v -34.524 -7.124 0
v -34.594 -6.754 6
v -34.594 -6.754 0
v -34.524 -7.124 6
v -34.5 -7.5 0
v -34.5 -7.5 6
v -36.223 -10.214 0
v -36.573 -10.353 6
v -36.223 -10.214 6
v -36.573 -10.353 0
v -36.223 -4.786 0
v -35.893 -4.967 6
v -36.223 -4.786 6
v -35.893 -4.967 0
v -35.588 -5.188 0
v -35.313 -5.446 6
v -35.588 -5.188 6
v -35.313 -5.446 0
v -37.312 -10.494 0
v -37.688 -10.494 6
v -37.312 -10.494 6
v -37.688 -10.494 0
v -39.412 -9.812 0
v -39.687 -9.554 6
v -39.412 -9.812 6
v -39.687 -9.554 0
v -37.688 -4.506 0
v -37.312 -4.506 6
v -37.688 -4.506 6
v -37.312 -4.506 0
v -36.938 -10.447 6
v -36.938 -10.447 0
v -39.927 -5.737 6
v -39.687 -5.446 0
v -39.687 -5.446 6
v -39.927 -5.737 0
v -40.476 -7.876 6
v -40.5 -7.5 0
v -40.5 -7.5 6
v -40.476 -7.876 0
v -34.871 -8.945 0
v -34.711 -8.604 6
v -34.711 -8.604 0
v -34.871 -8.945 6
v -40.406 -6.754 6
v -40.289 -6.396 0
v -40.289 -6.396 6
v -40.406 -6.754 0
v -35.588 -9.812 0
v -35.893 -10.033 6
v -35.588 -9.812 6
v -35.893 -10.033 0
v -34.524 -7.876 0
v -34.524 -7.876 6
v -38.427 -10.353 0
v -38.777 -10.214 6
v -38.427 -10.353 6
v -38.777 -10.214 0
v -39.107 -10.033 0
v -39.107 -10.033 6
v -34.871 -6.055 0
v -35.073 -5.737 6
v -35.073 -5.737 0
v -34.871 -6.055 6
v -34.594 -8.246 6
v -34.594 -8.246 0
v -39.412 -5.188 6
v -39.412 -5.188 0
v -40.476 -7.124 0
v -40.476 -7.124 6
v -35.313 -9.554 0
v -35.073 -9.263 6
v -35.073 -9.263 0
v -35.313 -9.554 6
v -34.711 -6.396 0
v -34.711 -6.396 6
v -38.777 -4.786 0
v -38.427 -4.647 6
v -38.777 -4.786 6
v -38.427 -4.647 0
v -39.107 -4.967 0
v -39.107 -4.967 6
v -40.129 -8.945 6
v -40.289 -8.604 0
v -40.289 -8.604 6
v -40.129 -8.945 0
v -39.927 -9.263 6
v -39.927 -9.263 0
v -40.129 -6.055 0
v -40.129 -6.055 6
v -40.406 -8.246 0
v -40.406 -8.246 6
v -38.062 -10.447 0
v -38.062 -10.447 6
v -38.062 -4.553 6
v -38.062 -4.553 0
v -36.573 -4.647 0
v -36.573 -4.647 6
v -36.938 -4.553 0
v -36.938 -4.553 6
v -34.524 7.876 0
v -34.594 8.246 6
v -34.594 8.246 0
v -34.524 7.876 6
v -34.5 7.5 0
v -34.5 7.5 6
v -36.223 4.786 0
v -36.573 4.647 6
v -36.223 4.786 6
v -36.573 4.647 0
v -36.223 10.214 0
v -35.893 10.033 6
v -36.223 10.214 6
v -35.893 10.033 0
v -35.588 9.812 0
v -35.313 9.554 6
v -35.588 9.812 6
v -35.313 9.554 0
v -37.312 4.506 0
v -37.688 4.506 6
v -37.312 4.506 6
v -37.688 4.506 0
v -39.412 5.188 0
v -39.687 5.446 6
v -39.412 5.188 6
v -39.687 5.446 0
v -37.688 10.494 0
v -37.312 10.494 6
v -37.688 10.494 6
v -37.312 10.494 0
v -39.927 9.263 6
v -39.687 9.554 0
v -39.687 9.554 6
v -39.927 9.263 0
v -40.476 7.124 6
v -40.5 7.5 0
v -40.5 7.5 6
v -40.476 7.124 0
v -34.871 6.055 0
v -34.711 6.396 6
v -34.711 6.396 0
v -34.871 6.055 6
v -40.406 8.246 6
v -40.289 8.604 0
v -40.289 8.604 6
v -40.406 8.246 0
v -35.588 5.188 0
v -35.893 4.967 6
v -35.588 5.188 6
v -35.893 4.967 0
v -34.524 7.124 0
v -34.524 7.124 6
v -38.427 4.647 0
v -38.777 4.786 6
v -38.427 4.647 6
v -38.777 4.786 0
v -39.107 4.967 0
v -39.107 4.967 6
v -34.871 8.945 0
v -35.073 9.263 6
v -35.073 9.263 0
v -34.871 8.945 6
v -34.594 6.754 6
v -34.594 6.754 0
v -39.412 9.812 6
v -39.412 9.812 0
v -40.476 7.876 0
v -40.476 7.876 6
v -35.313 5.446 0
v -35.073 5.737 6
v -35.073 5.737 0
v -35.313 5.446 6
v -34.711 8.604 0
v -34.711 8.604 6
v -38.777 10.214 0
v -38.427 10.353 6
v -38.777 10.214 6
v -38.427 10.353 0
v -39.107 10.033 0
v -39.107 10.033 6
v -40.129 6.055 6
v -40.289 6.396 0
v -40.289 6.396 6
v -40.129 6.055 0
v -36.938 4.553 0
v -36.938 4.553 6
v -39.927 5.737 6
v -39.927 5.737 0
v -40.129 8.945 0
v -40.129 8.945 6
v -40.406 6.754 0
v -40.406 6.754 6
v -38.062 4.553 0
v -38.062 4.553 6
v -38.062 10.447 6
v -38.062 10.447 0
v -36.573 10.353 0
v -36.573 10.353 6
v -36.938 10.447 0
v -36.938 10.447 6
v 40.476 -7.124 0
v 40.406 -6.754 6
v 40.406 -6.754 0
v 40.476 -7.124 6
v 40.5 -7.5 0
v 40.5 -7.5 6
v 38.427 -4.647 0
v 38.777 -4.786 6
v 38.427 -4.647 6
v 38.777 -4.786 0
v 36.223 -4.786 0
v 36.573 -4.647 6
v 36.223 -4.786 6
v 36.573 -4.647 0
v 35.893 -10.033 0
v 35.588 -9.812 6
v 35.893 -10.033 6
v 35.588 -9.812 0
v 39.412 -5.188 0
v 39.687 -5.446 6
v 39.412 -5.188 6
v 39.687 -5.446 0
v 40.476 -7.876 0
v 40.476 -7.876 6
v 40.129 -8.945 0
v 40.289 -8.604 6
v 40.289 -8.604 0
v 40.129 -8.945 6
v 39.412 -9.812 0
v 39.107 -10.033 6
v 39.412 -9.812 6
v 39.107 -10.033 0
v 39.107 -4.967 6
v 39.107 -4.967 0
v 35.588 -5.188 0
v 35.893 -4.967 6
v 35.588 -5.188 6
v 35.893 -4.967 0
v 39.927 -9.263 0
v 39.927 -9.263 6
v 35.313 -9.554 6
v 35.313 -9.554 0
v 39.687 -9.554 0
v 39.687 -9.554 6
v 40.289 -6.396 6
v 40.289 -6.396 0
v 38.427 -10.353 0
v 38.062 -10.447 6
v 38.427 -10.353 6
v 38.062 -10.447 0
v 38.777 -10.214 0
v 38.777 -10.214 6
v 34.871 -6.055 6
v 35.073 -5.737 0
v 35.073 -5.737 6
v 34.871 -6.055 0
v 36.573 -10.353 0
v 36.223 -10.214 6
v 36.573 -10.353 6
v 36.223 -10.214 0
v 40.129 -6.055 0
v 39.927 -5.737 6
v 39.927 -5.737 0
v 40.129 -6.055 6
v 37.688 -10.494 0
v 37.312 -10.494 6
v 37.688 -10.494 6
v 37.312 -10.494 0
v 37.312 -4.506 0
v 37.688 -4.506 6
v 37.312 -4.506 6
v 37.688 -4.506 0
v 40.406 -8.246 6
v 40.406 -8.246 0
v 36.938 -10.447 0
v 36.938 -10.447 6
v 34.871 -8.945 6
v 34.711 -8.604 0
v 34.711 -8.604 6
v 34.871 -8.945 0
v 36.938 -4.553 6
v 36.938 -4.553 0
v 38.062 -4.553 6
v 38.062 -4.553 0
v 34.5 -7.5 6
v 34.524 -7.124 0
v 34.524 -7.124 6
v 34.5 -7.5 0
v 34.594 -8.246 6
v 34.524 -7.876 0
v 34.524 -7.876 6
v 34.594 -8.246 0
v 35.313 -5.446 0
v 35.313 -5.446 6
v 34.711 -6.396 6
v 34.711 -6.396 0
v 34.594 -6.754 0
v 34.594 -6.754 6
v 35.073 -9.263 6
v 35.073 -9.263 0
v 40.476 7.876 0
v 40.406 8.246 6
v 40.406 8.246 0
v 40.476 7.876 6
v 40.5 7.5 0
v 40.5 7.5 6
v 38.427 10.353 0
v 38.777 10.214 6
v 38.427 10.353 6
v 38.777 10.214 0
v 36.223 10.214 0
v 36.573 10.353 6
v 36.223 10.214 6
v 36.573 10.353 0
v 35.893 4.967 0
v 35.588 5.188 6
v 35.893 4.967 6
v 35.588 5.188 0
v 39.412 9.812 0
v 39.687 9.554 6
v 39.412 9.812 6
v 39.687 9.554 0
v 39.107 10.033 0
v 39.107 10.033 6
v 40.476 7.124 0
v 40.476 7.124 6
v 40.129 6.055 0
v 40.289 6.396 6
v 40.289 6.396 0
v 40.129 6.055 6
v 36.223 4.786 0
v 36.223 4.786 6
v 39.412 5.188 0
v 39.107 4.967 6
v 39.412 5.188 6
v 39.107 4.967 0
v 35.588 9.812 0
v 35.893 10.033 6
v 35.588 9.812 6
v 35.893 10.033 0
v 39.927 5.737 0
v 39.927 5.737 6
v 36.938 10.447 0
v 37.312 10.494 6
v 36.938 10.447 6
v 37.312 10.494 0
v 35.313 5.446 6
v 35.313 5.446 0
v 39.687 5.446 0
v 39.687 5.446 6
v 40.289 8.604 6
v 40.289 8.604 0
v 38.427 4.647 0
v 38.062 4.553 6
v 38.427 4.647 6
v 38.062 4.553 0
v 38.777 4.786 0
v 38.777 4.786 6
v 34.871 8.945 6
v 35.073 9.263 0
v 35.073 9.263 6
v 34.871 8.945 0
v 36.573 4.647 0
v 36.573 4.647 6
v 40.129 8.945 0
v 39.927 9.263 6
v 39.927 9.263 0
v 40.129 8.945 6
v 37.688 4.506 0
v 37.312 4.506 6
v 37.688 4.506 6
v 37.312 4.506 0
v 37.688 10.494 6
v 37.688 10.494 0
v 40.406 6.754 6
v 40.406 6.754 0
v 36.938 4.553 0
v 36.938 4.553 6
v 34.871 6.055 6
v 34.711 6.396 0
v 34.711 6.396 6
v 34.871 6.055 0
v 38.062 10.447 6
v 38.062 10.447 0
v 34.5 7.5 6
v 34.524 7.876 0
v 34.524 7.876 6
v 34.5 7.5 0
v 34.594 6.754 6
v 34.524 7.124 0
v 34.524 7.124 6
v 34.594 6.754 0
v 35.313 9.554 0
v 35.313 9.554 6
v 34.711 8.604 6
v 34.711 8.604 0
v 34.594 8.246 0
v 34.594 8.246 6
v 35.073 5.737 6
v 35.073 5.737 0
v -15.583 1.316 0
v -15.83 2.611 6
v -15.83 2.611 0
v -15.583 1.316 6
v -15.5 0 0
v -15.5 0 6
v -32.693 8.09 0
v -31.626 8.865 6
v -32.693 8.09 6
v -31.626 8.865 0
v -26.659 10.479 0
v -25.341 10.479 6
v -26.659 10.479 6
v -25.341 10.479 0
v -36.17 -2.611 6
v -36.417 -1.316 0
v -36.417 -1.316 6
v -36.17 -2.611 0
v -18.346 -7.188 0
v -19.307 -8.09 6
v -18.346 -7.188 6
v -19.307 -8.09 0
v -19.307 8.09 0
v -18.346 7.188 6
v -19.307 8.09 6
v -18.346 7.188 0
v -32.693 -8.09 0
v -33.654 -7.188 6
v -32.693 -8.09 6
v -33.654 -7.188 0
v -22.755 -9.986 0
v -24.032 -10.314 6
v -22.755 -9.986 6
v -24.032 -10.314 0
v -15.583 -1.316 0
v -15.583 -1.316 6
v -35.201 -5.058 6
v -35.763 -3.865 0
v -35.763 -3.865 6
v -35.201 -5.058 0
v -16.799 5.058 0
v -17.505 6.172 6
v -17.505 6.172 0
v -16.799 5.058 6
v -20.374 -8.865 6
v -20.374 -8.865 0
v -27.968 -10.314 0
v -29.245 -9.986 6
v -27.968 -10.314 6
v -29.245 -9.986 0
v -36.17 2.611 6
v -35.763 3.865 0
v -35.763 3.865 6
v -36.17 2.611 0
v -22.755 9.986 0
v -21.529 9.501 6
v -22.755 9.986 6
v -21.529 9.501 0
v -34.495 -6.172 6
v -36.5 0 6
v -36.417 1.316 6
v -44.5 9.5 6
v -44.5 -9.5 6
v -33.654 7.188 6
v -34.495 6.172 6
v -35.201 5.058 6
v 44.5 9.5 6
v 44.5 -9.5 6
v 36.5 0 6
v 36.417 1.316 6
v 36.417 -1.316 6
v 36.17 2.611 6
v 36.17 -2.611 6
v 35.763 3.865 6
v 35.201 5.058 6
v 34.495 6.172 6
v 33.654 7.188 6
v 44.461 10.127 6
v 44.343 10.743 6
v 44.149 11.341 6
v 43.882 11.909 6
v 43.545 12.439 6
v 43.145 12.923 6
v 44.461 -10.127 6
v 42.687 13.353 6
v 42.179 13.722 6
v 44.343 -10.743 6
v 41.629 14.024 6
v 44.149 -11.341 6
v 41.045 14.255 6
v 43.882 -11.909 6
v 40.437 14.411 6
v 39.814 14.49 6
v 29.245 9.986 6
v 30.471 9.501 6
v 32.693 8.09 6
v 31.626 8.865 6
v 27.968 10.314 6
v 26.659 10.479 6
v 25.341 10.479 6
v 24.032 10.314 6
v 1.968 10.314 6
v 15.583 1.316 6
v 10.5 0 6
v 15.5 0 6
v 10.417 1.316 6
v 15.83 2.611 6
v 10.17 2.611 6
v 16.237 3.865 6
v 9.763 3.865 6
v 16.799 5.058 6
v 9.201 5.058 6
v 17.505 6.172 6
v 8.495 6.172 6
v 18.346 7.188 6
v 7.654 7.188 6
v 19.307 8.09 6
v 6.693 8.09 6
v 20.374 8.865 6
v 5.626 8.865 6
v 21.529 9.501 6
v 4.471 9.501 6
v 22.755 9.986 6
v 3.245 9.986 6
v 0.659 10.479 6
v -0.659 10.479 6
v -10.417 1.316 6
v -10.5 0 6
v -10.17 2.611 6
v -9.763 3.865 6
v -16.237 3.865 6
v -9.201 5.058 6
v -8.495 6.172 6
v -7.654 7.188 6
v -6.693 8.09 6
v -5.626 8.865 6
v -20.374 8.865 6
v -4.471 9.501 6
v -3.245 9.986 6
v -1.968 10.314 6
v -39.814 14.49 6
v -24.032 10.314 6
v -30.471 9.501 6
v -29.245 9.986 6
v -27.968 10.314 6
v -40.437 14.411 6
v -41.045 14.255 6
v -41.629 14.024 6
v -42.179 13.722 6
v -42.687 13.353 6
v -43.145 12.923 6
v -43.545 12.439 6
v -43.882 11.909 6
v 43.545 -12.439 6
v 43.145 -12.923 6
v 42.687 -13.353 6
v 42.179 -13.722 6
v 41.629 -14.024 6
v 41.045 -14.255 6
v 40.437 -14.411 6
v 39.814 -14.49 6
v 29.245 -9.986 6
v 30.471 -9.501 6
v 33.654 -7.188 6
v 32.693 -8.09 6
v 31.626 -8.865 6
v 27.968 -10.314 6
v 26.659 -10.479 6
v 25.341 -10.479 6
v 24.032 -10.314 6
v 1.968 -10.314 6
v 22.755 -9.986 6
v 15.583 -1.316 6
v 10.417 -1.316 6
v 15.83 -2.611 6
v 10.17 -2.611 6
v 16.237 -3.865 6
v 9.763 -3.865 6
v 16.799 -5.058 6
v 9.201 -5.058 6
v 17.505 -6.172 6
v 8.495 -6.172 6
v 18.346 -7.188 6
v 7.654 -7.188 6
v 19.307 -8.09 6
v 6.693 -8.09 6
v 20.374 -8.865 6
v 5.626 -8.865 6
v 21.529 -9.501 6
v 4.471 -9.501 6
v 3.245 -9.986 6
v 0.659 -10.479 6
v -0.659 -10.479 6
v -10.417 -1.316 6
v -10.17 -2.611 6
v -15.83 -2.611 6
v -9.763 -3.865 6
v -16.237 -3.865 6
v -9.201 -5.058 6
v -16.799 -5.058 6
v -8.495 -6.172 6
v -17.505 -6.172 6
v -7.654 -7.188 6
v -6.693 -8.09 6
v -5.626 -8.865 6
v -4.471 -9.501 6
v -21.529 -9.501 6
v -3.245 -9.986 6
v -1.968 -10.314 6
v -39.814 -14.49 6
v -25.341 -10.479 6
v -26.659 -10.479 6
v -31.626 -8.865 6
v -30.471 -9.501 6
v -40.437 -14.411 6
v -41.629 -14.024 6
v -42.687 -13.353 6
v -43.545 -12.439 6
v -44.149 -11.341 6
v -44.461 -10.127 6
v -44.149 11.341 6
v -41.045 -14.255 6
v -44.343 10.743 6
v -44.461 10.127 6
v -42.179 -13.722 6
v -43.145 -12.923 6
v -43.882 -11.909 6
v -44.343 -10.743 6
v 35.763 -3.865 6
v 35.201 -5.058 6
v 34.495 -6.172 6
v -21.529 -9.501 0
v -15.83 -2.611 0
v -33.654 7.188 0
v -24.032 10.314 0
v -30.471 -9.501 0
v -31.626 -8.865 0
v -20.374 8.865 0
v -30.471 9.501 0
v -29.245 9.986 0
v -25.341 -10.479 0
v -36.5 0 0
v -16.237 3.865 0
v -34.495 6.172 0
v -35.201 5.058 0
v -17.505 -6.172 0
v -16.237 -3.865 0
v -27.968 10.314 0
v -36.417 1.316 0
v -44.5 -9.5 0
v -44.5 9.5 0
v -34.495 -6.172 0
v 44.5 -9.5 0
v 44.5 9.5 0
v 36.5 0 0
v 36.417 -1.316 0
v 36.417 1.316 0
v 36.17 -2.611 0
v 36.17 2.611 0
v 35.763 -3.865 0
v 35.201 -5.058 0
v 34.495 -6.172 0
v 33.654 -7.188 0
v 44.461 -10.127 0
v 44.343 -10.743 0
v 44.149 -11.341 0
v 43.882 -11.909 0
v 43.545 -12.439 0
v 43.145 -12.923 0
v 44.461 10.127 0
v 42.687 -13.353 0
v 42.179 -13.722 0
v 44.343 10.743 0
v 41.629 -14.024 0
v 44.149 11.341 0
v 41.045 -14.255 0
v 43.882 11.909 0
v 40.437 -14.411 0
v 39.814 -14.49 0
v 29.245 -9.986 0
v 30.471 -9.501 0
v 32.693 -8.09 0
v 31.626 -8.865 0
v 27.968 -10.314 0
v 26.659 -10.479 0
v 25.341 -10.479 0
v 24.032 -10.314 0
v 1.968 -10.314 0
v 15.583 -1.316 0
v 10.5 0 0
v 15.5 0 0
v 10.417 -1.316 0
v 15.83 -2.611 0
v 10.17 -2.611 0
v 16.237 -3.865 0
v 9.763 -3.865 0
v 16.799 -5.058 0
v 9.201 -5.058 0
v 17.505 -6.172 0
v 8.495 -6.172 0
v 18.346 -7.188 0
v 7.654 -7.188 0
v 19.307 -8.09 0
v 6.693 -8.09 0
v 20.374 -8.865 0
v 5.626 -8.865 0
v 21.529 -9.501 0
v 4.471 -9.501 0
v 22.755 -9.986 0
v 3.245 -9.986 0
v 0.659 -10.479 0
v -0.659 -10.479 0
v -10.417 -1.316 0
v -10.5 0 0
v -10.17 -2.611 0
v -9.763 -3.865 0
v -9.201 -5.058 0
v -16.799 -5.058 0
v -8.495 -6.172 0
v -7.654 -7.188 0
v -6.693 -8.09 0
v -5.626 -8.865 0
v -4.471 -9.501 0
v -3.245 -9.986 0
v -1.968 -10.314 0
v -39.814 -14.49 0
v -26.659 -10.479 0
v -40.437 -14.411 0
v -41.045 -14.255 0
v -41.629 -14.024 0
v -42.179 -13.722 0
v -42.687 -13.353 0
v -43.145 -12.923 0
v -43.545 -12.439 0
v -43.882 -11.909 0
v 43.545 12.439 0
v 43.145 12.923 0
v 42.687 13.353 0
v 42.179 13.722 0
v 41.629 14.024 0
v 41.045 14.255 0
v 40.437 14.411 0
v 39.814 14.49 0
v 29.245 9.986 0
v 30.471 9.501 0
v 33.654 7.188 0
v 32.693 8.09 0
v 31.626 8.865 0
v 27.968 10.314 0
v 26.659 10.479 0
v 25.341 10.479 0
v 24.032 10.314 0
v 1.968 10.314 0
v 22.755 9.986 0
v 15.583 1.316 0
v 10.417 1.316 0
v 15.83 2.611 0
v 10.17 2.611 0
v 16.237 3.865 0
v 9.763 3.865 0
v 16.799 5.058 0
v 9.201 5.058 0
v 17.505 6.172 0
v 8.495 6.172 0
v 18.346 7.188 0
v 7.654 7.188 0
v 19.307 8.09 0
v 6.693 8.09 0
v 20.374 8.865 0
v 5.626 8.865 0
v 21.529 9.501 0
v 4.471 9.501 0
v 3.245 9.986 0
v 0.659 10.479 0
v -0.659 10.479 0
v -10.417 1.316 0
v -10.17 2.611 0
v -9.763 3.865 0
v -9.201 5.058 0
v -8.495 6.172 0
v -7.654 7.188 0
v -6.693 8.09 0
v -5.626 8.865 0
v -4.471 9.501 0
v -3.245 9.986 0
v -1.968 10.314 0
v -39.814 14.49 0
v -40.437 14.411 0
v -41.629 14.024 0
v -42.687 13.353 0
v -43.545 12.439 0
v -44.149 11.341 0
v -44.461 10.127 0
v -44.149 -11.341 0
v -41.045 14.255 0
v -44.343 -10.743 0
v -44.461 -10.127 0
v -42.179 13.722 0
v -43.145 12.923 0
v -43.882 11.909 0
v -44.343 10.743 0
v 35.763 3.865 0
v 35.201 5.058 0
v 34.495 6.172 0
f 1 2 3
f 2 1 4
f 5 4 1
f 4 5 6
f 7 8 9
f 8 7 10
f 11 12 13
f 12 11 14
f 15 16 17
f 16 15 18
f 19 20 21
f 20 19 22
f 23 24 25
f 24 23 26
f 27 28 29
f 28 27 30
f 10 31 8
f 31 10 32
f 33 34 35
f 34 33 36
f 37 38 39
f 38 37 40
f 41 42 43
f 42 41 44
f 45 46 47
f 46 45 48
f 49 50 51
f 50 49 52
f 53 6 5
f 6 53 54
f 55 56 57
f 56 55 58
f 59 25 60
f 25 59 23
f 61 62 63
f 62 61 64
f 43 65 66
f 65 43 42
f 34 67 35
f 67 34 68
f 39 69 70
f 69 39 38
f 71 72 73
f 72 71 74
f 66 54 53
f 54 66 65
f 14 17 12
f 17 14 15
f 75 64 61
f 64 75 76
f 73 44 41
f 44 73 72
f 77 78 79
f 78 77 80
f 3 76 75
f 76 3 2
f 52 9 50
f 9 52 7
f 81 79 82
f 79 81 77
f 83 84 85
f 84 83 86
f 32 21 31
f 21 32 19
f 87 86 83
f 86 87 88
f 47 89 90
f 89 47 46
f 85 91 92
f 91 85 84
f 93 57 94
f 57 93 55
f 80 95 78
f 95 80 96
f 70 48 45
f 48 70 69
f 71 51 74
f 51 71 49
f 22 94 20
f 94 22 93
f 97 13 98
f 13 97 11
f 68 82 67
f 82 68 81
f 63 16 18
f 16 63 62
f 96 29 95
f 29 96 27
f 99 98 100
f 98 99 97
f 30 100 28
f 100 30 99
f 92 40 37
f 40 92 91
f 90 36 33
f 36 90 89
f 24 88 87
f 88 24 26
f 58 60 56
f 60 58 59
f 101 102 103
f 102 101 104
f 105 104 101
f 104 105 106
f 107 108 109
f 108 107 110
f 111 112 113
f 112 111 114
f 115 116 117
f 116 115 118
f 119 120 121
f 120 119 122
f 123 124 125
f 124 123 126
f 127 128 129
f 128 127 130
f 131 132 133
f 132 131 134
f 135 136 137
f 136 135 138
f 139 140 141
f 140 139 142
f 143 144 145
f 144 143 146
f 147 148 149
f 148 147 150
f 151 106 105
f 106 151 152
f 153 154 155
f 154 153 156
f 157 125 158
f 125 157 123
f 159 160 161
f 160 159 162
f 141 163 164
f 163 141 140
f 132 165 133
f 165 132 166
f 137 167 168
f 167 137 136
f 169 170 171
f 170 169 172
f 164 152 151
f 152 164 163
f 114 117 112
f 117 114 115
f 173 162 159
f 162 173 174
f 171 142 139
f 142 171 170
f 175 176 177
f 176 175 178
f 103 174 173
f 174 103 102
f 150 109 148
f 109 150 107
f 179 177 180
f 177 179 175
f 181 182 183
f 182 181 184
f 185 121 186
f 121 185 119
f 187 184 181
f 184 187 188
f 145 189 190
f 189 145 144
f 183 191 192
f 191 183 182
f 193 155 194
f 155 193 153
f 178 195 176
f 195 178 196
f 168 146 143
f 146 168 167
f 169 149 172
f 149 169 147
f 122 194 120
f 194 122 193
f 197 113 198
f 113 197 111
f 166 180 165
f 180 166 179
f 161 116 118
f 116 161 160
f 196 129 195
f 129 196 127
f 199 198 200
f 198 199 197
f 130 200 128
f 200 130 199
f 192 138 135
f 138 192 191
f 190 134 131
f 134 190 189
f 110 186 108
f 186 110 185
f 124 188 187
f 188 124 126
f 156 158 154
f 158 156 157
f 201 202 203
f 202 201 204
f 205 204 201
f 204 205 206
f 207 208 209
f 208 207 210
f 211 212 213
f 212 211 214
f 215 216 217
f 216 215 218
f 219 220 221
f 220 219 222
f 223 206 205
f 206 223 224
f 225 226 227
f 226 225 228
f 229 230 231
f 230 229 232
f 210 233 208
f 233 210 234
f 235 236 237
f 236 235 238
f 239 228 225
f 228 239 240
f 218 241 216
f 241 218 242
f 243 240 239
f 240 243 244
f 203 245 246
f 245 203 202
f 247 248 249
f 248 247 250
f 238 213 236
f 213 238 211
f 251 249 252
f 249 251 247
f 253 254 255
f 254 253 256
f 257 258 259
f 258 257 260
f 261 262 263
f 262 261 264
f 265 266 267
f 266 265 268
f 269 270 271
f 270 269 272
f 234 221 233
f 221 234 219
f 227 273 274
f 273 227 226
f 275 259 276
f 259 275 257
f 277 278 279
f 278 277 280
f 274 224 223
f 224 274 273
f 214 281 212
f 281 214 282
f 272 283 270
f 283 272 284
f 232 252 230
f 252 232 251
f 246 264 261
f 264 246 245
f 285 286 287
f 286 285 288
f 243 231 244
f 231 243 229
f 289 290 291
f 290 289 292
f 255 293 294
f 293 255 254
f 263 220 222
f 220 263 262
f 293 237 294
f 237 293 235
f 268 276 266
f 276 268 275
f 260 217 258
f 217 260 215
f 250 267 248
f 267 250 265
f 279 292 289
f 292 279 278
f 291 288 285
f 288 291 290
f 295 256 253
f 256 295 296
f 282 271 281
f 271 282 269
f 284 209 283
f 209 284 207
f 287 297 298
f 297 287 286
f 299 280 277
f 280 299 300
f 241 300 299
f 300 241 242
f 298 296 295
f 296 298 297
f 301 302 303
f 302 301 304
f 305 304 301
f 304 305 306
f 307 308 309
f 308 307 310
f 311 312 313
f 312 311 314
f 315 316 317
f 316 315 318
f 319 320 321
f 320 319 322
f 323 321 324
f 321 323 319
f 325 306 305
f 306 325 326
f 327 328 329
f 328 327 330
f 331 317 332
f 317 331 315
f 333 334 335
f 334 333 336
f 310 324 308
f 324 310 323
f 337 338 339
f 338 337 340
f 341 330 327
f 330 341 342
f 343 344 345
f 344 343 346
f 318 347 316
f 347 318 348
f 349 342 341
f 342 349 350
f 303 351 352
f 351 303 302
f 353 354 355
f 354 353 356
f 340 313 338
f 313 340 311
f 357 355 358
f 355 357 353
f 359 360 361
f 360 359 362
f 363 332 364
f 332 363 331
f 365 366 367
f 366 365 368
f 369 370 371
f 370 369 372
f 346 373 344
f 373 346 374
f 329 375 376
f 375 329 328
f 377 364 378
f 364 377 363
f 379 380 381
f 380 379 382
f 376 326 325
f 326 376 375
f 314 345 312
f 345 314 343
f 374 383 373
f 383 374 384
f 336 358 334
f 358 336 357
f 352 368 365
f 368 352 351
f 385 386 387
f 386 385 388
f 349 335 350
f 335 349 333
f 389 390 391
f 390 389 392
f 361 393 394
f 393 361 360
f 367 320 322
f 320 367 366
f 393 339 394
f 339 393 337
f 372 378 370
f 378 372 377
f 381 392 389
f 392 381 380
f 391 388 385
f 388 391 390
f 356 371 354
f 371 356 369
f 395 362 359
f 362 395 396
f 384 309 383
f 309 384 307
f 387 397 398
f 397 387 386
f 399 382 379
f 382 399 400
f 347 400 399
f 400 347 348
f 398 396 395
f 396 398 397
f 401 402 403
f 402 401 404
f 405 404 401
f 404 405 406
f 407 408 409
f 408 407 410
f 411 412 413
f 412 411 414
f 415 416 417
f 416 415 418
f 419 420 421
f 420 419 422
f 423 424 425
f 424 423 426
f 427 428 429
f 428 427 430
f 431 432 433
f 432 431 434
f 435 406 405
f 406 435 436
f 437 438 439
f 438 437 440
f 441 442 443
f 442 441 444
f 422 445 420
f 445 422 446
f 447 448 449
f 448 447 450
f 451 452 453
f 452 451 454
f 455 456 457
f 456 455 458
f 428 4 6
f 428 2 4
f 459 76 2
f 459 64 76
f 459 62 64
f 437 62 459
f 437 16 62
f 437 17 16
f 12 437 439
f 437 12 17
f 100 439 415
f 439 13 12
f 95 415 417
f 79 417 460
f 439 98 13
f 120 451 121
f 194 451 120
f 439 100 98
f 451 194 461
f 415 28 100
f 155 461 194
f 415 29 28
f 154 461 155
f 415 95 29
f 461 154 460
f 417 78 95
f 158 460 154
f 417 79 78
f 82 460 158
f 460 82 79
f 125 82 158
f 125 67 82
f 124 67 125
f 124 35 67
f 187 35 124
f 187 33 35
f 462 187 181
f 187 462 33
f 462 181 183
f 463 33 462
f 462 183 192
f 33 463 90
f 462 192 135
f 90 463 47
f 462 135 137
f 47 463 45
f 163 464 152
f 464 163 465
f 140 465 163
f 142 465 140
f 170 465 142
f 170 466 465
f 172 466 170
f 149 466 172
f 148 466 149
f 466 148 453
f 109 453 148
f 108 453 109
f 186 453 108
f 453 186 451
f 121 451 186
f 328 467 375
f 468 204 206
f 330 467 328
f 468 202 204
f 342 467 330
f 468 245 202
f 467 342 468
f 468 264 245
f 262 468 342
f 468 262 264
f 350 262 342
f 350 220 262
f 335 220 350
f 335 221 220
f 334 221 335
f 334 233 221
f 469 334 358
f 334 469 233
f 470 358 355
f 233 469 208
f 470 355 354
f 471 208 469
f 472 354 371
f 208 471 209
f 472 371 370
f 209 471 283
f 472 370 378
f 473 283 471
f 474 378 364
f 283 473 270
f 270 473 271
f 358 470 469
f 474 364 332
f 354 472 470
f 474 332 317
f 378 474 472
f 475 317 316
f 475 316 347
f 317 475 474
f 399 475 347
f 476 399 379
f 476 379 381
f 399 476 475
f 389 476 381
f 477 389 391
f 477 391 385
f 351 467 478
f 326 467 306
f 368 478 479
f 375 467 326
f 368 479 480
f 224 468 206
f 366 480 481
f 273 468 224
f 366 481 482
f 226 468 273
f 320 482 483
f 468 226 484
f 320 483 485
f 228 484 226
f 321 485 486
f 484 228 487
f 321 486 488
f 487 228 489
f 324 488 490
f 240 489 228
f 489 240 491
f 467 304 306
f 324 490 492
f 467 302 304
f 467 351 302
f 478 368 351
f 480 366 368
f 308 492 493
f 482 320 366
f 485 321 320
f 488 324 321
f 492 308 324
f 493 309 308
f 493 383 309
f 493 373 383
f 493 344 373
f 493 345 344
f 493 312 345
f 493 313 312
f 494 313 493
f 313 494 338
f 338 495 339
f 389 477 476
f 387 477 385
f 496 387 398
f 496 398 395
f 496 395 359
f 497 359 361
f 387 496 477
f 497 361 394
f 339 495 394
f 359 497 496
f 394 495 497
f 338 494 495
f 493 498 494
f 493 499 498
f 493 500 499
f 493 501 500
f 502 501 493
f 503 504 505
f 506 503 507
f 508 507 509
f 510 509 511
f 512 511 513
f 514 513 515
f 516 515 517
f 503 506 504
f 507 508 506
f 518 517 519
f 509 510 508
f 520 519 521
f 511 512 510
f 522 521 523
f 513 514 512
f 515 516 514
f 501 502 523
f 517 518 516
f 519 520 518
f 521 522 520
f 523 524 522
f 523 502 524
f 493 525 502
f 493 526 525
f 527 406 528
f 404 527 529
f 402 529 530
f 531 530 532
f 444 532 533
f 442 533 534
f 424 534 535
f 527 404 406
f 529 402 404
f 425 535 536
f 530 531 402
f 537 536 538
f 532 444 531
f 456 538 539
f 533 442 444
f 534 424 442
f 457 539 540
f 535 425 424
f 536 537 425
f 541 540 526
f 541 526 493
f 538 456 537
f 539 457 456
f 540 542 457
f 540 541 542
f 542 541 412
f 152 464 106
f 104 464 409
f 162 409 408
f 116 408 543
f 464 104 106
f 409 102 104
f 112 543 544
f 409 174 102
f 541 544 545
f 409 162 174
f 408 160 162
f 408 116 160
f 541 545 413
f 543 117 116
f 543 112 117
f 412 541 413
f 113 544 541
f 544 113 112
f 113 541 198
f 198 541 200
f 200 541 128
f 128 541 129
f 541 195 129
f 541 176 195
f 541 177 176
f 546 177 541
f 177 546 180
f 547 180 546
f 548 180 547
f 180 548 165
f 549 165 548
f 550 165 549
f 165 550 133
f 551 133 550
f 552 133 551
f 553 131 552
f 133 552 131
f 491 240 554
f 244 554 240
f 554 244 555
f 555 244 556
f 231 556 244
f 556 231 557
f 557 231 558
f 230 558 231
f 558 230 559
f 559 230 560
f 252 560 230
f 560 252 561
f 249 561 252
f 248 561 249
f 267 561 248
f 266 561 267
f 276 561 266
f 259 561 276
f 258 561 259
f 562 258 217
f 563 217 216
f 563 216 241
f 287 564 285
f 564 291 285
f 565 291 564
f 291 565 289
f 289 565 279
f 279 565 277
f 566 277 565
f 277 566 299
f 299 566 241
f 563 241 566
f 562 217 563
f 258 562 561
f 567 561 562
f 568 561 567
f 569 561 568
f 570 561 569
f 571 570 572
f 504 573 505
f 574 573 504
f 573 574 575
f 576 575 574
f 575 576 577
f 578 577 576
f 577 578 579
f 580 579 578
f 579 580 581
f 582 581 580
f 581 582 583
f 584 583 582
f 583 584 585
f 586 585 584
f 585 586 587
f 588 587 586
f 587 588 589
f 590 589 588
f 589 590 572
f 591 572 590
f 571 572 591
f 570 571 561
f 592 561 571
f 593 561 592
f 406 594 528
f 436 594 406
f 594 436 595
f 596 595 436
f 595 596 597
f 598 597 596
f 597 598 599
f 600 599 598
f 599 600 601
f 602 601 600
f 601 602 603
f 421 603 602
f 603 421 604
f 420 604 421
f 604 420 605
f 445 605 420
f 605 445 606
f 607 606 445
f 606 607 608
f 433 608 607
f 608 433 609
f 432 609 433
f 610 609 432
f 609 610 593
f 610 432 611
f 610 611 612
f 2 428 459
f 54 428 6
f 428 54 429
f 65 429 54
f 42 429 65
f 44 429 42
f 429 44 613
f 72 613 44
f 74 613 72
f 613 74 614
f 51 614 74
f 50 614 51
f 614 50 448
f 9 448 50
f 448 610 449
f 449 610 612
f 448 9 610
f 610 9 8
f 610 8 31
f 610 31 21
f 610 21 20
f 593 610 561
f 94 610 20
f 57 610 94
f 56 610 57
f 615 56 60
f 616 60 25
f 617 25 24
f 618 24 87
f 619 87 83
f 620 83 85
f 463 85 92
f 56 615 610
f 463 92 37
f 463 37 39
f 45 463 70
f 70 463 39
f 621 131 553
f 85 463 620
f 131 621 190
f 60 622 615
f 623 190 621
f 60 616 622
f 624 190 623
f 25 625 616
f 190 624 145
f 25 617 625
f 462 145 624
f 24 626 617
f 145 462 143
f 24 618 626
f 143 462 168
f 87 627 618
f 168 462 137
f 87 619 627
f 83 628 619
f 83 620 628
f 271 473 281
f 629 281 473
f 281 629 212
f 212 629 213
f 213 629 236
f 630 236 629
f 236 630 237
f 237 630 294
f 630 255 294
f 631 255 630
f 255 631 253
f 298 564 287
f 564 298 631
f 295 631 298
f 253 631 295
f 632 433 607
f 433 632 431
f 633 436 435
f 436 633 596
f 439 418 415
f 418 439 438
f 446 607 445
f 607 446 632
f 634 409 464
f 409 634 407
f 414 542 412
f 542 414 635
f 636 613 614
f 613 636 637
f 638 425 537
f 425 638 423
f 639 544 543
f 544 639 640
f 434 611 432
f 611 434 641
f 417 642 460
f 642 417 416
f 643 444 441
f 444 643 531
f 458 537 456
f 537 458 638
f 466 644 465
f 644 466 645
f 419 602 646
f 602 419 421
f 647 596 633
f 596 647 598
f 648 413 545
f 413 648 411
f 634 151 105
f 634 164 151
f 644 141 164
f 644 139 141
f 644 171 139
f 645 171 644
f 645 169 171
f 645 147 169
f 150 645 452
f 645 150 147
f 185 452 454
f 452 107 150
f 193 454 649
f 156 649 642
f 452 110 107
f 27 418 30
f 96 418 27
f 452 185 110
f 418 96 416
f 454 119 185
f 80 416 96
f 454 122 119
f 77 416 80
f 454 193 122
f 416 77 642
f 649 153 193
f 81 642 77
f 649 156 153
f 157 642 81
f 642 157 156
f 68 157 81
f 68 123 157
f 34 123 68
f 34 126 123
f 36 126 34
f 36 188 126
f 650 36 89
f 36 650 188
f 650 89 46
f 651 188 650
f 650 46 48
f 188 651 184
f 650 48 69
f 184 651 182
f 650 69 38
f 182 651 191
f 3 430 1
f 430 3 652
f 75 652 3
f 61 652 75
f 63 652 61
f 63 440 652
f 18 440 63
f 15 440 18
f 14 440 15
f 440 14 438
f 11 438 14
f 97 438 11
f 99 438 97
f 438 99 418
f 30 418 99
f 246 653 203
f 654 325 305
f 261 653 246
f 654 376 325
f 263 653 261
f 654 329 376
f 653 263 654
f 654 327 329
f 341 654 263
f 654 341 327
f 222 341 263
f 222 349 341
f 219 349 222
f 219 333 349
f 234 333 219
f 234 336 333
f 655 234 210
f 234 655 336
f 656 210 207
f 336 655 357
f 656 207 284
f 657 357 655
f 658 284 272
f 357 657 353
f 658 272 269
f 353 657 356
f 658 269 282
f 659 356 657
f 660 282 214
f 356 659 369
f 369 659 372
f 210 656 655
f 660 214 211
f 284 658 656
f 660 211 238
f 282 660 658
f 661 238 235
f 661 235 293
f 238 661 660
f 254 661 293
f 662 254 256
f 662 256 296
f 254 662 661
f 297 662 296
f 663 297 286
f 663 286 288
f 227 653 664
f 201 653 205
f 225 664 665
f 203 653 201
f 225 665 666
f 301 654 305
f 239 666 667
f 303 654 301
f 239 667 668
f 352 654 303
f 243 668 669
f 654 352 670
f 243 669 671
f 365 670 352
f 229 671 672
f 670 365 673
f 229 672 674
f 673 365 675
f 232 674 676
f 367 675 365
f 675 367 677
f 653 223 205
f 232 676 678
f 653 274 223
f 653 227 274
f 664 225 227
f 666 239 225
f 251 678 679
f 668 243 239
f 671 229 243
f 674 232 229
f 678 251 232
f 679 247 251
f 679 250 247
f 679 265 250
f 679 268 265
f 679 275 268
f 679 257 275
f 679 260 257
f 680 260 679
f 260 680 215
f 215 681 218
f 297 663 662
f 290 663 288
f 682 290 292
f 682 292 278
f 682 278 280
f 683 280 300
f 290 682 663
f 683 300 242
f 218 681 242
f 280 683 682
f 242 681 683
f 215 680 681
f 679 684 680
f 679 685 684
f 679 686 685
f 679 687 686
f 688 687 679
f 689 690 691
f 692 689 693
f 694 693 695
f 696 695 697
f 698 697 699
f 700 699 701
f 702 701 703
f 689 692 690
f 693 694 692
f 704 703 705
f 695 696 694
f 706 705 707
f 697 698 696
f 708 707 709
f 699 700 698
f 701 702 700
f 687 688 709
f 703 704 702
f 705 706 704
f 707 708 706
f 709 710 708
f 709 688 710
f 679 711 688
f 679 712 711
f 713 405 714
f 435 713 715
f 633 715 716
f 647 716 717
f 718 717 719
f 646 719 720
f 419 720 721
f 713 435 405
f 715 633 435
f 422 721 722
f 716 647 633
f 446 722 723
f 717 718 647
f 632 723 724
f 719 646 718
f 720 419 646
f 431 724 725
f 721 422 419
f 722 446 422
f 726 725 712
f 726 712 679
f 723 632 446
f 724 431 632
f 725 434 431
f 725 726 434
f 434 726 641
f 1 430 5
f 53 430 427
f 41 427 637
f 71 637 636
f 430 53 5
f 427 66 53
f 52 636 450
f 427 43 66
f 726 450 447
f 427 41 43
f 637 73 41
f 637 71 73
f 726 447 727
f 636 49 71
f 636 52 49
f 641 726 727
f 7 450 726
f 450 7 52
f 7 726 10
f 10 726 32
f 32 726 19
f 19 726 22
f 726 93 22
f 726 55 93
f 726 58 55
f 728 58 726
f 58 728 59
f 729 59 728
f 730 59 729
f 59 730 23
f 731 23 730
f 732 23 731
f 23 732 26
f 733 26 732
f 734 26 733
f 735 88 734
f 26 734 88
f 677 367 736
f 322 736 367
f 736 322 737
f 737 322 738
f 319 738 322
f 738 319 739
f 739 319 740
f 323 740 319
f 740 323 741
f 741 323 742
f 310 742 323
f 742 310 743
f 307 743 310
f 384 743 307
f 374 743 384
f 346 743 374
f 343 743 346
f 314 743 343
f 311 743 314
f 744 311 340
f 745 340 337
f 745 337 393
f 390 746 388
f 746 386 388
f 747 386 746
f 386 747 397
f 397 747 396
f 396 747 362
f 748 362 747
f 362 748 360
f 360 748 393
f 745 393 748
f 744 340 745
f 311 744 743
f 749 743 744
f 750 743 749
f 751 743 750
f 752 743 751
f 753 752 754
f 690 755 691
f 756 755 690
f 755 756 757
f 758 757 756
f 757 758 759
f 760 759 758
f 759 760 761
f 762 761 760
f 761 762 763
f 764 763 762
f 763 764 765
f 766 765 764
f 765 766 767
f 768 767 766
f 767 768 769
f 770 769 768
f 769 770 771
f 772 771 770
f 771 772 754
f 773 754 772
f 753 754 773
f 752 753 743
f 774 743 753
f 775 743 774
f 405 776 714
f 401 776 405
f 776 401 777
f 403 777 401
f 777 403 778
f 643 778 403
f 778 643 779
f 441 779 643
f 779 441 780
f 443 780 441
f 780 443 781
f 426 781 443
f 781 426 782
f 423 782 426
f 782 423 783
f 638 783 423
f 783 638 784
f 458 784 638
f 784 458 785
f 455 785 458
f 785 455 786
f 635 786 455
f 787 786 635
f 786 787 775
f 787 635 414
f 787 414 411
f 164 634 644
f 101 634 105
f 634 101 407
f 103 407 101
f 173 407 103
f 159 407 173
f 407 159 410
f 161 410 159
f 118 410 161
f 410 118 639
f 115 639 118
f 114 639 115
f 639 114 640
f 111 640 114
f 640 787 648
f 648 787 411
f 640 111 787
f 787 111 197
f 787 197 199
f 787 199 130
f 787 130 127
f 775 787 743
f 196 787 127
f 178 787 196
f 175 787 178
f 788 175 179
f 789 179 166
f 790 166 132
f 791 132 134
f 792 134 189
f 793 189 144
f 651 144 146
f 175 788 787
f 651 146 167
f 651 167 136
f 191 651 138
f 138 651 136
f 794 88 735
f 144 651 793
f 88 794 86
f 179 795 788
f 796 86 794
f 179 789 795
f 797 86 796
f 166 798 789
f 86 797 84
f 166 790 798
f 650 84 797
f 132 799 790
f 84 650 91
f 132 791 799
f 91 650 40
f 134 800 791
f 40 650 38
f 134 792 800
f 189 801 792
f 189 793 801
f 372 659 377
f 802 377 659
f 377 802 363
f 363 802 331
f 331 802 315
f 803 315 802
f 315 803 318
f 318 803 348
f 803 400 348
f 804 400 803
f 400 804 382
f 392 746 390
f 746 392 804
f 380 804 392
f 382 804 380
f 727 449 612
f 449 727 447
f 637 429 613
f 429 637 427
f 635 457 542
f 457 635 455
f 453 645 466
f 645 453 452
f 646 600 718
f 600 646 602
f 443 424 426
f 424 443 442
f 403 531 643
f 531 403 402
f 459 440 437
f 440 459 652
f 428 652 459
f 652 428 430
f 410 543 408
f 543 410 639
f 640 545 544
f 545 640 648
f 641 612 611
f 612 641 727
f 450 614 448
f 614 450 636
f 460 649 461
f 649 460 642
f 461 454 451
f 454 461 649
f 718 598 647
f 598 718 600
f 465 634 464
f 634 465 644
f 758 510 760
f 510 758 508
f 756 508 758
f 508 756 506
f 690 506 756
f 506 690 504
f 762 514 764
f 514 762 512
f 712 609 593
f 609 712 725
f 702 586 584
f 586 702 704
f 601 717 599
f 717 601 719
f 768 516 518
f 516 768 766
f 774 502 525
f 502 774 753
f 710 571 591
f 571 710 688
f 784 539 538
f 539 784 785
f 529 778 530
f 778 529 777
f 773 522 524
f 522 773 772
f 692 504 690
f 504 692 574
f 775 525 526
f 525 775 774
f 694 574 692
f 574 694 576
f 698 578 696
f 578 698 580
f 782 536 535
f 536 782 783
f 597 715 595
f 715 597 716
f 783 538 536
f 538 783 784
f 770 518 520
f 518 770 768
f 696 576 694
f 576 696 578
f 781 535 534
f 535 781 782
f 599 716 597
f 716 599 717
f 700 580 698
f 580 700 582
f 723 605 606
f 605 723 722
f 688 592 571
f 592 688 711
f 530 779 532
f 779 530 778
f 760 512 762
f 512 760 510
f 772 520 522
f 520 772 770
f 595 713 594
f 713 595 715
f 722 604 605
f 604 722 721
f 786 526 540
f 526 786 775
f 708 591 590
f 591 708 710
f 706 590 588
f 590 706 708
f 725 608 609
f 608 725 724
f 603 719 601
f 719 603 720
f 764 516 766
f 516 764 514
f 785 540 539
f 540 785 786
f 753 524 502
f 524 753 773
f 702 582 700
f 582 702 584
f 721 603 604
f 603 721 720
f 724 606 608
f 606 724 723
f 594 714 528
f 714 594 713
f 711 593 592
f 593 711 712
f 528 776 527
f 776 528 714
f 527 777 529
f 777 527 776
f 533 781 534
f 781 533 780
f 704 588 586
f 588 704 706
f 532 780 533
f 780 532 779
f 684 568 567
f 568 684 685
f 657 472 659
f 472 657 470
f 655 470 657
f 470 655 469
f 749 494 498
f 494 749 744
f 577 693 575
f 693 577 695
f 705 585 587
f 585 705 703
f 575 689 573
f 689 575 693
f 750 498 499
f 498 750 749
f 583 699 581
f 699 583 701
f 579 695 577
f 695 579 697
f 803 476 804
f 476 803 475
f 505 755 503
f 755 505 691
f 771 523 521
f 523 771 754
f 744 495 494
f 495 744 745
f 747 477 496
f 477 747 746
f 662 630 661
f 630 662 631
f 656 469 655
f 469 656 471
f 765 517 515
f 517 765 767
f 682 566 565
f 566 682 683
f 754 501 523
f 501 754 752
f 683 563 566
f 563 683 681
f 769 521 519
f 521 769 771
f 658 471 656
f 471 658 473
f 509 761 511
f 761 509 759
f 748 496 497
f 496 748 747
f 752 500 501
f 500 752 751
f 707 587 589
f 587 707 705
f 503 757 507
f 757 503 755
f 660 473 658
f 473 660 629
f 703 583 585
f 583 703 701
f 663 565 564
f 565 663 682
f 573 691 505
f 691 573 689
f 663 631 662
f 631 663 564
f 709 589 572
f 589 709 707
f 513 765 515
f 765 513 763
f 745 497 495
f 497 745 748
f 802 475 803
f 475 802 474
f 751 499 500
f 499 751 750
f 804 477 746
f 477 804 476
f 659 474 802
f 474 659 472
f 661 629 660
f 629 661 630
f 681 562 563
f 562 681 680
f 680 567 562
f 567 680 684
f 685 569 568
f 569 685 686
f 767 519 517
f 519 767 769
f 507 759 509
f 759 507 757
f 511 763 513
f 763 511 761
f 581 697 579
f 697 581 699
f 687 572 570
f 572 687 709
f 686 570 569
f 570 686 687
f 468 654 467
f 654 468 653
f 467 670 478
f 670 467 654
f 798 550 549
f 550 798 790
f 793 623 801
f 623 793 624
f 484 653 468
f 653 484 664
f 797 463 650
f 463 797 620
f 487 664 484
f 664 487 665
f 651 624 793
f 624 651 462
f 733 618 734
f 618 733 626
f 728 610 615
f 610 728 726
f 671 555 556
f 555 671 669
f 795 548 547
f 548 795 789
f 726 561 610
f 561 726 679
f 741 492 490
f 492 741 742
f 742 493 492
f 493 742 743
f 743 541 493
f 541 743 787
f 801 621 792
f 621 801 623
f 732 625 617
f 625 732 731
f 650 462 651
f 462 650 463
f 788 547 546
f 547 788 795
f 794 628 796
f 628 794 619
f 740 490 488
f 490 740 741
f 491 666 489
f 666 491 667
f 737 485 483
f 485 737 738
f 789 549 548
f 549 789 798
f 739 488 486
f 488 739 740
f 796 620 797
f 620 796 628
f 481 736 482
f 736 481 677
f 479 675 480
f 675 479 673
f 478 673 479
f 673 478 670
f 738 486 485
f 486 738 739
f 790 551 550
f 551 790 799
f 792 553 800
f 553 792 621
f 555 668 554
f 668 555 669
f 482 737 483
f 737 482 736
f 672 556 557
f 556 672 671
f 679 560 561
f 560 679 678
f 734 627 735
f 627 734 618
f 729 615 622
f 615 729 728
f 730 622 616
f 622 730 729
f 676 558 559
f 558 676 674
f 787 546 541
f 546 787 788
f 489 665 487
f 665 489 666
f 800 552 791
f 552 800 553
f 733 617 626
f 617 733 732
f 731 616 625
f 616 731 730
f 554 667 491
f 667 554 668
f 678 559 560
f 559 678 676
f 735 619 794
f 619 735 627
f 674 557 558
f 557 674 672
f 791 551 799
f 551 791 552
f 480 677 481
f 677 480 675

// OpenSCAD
$fn = 50;


difference() {
	union() {
		hull() {
			translate(v = [-39.5000000000, 9.5000000000, 0]) {
				cylinder(h = 6, r = 5);
			}
			translate(v = [39.5000000000, 9.5000000000, 0]) {
				cylinder(h = 6, r = 5);
			}
			translate(v = [-39.5000000000, -9.5000000000, 0]) {
				cylinder(h = 6, r = 5);
			}
			translate(v = [39.5000000000, -9.5000000000, 0]) {
				cylinder(h = 6, r = 5);
			}
		}
	}
	union() {
		#translate(v = [-37.5000000000, -7.5000000000, -100.0000000000]) {
			cylinder(h = 200, r = 3.0000000000);
		}
		#translate(v = [-37.5000000000, 7.5000000000, -100.0000000000]) {
			cylinder(h = 200, r = 3.0000000000);
		}
		#translate(v = [37.5000000000, -7.5000000000, -100.0000000000]) {
			cylinder(h = 200, r = 3.0000000000);
		}
		#translate(v = [37.5000000000, 7.5000000000, -100.0000000000]) {
			cylinder(h = 200, r = 3.0000000000);
		}
		#translate(v = [-26.0000000000, 0, 0]) {
			cylinder(h = 6, r = 10.5000000000);
		}
		#cylinder(h = 6, r = 10.5000000000);
		#translate(v = [26.0000000000, 0, 0]) {
			cylinder(h = 6, r = 10.5000000000);
		}
	}
}
